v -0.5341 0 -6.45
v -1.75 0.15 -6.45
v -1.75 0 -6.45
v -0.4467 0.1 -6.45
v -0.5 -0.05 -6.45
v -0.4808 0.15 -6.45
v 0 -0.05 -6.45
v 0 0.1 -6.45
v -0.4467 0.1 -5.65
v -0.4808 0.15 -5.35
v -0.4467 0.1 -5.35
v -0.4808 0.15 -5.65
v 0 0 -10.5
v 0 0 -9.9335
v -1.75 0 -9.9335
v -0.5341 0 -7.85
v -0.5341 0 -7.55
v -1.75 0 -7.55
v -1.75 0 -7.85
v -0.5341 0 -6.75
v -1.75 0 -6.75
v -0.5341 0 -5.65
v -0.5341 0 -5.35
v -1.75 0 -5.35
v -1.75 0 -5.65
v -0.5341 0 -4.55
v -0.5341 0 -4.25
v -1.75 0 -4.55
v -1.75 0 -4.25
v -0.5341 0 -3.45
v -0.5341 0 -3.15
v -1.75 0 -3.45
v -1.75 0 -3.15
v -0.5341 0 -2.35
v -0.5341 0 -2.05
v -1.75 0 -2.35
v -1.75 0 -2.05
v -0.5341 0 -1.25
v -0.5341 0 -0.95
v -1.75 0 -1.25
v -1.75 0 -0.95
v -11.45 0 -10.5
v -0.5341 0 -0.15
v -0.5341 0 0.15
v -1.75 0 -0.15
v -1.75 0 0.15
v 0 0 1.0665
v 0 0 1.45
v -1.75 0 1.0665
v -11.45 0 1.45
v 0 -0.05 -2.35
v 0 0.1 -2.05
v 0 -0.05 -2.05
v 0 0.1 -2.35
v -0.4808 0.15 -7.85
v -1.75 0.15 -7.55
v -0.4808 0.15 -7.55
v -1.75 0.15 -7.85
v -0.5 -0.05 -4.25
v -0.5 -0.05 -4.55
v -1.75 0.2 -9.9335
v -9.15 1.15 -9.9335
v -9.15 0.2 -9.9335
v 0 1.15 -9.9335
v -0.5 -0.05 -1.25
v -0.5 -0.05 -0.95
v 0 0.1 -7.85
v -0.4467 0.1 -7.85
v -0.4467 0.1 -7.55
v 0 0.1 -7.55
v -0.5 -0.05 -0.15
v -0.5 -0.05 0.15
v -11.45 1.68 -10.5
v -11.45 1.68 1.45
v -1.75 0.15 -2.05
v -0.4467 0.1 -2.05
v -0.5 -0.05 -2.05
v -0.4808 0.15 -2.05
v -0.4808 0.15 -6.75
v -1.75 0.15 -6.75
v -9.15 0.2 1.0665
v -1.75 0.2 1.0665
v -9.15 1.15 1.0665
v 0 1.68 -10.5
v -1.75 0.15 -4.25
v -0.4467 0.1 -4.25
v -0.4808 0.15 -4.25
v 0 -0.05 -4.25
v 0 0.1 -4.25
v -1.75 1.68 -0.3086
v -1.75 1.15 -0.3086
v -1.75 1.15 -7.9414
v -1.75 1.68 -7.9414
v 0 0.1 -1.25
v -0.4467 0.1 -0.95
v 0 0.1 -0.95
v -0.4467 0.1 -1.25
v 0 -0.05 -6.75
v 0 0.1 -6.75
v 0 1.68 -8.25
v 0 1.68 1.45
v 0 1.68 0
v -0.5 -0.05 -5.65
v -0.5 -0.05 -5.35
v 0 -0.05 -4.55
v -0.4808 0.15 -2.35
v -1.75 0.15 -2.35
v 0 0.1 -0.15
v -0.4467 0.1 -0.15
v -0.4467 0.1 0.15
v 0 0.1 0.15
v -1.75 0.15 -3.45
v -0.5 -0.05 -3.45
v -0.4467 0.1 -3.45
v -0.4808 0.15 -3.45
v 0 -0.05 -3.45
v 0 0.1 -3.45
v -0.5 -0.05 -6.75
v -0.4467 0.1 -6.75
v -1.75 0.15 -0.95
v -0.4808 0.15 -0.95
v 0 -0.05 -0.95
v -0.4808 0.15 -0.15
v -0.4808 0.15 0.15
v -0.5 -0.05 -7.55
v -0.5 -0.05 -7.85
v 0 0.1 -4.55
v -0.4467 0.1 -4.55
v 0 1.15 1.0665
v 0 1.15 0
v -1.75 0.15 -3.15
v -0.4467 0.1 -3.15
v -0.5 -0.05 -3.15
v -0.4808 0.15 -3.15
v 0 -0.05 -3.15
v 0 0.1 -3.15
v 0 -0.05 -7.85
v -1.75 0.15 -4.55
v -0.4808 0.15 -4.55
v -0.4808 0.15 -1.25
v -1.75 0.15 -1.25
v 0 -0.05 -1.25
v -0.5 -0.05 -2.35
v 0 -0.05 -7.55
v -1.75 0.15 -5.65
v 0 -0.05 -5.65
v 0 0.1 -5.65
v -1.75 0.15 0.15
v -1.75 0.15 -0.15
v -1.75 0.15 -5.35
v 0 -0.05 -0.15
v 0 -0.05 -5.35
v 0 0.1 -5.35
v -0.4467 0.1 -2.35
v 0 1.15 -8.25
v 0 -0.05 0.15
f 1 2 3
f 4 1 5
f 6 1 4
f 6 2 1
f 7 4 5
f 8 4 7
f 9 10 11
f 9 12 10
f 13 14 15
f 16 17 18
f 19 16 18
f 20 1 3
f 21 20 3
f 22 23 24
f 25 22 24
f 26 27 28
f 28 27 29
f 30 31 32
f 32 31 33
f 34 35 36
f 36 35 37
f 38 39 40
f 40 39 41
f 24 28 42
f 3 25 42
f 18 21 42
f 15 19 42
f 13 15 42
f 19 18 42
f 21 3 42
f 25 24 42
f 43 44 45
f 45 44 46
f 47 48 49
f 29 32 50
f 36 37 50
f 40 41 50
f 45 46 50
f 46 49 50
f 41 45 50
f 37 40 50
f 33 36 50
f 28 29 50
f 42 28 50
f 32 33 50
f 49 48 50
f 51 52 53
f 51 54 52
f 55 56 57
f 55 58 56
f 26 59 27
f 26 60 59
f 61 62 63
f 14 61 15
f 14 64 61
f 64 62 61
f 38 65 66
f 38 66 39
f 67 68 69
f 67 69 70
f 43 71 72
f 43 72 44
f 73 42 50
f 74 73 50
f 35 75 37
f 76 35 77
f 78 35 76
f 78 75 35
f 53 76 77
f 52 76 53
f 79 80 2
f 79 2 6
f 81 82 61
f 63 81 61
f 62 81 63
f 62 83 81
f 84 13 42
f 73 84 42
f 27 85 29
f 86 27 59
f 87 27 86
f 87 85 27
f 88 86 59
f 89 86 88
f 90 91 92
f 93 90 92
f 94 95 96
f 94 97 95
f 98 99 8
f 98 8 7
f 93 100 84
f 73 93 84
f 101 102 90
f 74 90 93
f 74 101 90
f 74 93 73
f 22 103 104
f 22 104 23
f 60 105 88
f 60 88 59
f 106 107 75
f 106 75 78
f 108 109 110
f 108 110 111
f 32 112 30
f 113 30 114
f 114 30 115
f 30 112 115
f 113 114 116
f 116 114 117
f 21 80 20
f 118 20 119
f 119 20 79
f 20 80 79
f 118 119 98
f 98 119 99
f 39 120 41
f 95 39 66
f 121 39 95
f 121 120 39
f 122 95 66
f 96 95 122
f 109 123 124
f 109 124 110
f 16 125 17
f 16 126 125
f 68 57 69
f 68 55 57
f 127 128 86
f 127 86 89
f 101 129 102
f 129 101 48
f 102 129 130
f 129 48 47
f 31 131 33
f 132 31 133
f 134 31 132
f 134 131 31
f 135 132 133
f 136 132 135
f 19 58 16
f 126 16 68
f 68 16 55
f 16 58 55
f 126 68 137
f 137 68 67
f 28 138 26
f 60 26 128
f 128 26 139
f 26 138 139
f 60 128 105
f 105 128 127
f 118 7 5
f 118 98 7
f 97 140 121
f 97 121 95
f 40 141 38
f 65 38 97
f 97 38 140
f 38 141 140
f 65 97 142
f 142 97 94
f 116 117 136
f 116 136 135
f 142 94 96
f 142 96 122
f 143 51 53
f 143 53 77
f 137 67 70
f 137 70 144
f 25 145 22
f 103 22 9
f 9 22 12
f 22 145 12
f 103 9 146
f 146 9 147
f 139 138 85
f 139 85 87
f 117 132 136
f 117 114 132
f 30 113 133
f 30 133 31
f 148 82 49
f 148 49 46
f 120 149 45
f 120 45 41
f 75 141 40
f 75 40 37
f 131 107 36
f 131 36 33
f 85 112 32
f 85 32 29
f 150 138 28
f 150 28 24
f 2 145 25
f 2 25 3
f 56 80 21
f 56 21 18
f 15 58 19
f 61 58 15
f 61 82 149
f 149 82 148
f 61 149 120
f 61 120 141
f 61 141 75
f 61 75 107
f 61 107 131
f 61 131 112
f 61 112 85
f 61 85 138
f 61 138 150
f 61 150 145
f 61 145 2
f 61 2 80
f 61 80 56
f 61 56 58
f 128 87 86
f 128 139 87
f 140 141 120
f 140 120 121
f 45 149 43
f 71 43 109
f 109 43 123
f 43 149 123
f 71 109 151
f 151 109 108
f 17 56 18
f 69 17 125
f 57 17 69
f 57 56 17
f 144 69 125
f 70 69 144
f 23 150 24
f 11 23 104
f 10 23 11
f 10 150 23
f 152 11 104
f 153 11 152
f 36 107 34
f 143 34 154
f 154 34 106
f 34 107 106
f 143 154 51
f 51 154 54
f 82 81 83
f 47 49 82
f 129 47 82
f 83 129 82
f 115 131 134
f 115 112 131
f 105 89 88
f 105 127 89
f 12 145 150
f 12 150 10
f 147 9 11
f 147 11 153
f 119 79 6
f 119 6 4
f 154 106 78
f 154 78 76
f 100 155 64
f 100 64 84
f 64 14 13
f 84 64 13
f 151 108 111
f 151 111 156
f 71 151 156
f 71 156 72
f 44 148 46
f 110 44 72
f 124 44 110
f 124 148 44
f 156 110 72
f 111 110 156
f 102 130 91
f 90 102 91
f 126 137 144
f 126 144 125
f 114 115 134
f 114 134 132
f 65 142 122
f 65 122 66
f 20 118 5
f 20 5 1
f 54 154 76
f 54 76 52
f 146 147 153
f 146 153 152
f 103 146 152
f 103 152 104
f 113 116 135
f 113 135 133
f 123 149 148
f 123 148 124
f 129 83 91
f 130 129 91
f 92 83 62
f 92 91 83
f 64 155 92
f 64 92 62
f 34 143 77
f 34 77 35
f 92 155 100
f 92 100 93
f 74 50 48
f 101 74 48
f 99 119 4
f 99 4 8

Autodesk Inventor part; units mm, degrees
ref_plane "YZ Plane" through (0, 0, 0) normal (1, 0, 0) x (0, 1, 0)
ref_plane "XZ Plane" through (0, 0, 0) normal (0, 1, 0) x (-1, 0, 0)
ref_plane "XY Plane" through (0, 0, 0) normal (0, 0, 1) x (1, 0, 0)
sketch "Sketch2" plane through (0, 0, 0) normal (0, 1, 0) x (-1, 0, 0)
  line L0 (11.45, 1.45) -> (0, 1.45)
  line L1 (0, 1.45) -> (0, -10.5)
  line L2 (0, -10.5) -> (11.45, -10.5)
  line L3 (11.45, -10.5) -> (11.45, 1.45)
  line L4 (1.75, 0) -> (1.75, -8.25)
  line L5 (0, 0) -> (1.75, 0) construction
  line L6 (1.75, -8.25) -> (0, -8.25) construction
  line L7 (0, 0) -> (1.75, -0.3086)
  line L8 (0, -8.25) -> (1.75, -7.9414)
  line L9 (0, 0) -> (0, -8.25)
  dimension "d9" = 0
  dimension "d10" = 11.45
  dimension "d11" = 11.95
  dimension "d12" = 10.5
  dimension "d13" = 1.75
  dimension "d14" = 8.25
  dimension "d15" = 10
  dimension "d16" = 10
extrude "Extrusion2" add sketch "Sketch2" along normal blind 1.68 contours L3 L2 L1 L8 L4 L7 L0
sketch "Sketch3" plane through (0, 0, 1.45) normal (1, 0, 0) x (0, 0, -1)
  line L0 (11.95, 0) -> (0, 0) projected
  line L1 (11.3835, 0) -> (0.3835, 0)
  line L2 (0.3835, 0) -> (0.3835, 1.15)
  line L3 (0.3835, 1.15) -> (11.3835, 1.15)
  line L4 (11.3835, 1.15) -> (11.3835, 0)
  point P0 (1.45, 0)
  dimension "d19" = 11
  dimension "d20" = 1.15
extrude "Extrusion3" cut sketch "Sketch3" against normal blind 9.15
sketch "Sketch4" plane through (-1.75, 1.68, -0.3086) normal (1, 0, 0) x (0, 0, -1)
  line L0 (-1.3751, -1.68) -> (-1.3751, -0.53) projected
  line L1 (9.6249, -1.68) -> (-1.3751, -1.68) projected
  line L2 (-1.3751, -1.48) -> (9.6249, -1.48)
  line L3 (9.6249, -1.48) -> (9.6249, -1.68)
  line L4 (9.6249, -1.68) -> (-1.3751, -1.68)
  line L5 (-1.3751, -1.68) -> (-1.3751, -1.48)
  line L6 (0, -0.53) -> (7.6329, -0.53) projected
  line L7 (3.8164, -0.53) -> (5.5042, -0.53)
  point P0 (-0.3086, -1.68)
  dimension "d23" = 0.95
extrude "Extrusion4" add sketch "Sketch4" against normal up to next
sketch "Sketch5" plane through (0, 0, 0) normal (0, 0, 1) x (1, 0, 0)
  line L0 (-2, 0.15) -> (-0.4808, 0.15)
  line L1 (-0.4808, 0.15) -> (-0.4467, 0.1)
  line L2 (-0.4467, 0.1) -> (0, 0.1)
  line L3 (0, 0.1) -> (0, -0.05)
  line L4 (0, -0.05) -> (-0.5, -0.05)
  line L5 (-0.5, -0.05) -> (-0.5341, 0)
  line L6 (-0.5341, 0) -> (-2, 0)
  line L7 (-2, 0) -> (-2, 0.15)
  point P0 (0, 0)
  dimension "d26" = 0
  dimension "d27" = 0.5
  dimension "d28" = 2
  dimension "d29" = 0.05
  dimension "d30" = 0.15
  dimension "d32" = 0.15
  dimension "d33" = 0.2
extrude "Extrusion5" add sketch "Sketch5" along normal mid plane 0.3
pattern_linear "Rectangular Pattern1" count 8 spacing 1.1 along (0, 0, -1) of "Extrusion5"
properties part number "uSDCard"
